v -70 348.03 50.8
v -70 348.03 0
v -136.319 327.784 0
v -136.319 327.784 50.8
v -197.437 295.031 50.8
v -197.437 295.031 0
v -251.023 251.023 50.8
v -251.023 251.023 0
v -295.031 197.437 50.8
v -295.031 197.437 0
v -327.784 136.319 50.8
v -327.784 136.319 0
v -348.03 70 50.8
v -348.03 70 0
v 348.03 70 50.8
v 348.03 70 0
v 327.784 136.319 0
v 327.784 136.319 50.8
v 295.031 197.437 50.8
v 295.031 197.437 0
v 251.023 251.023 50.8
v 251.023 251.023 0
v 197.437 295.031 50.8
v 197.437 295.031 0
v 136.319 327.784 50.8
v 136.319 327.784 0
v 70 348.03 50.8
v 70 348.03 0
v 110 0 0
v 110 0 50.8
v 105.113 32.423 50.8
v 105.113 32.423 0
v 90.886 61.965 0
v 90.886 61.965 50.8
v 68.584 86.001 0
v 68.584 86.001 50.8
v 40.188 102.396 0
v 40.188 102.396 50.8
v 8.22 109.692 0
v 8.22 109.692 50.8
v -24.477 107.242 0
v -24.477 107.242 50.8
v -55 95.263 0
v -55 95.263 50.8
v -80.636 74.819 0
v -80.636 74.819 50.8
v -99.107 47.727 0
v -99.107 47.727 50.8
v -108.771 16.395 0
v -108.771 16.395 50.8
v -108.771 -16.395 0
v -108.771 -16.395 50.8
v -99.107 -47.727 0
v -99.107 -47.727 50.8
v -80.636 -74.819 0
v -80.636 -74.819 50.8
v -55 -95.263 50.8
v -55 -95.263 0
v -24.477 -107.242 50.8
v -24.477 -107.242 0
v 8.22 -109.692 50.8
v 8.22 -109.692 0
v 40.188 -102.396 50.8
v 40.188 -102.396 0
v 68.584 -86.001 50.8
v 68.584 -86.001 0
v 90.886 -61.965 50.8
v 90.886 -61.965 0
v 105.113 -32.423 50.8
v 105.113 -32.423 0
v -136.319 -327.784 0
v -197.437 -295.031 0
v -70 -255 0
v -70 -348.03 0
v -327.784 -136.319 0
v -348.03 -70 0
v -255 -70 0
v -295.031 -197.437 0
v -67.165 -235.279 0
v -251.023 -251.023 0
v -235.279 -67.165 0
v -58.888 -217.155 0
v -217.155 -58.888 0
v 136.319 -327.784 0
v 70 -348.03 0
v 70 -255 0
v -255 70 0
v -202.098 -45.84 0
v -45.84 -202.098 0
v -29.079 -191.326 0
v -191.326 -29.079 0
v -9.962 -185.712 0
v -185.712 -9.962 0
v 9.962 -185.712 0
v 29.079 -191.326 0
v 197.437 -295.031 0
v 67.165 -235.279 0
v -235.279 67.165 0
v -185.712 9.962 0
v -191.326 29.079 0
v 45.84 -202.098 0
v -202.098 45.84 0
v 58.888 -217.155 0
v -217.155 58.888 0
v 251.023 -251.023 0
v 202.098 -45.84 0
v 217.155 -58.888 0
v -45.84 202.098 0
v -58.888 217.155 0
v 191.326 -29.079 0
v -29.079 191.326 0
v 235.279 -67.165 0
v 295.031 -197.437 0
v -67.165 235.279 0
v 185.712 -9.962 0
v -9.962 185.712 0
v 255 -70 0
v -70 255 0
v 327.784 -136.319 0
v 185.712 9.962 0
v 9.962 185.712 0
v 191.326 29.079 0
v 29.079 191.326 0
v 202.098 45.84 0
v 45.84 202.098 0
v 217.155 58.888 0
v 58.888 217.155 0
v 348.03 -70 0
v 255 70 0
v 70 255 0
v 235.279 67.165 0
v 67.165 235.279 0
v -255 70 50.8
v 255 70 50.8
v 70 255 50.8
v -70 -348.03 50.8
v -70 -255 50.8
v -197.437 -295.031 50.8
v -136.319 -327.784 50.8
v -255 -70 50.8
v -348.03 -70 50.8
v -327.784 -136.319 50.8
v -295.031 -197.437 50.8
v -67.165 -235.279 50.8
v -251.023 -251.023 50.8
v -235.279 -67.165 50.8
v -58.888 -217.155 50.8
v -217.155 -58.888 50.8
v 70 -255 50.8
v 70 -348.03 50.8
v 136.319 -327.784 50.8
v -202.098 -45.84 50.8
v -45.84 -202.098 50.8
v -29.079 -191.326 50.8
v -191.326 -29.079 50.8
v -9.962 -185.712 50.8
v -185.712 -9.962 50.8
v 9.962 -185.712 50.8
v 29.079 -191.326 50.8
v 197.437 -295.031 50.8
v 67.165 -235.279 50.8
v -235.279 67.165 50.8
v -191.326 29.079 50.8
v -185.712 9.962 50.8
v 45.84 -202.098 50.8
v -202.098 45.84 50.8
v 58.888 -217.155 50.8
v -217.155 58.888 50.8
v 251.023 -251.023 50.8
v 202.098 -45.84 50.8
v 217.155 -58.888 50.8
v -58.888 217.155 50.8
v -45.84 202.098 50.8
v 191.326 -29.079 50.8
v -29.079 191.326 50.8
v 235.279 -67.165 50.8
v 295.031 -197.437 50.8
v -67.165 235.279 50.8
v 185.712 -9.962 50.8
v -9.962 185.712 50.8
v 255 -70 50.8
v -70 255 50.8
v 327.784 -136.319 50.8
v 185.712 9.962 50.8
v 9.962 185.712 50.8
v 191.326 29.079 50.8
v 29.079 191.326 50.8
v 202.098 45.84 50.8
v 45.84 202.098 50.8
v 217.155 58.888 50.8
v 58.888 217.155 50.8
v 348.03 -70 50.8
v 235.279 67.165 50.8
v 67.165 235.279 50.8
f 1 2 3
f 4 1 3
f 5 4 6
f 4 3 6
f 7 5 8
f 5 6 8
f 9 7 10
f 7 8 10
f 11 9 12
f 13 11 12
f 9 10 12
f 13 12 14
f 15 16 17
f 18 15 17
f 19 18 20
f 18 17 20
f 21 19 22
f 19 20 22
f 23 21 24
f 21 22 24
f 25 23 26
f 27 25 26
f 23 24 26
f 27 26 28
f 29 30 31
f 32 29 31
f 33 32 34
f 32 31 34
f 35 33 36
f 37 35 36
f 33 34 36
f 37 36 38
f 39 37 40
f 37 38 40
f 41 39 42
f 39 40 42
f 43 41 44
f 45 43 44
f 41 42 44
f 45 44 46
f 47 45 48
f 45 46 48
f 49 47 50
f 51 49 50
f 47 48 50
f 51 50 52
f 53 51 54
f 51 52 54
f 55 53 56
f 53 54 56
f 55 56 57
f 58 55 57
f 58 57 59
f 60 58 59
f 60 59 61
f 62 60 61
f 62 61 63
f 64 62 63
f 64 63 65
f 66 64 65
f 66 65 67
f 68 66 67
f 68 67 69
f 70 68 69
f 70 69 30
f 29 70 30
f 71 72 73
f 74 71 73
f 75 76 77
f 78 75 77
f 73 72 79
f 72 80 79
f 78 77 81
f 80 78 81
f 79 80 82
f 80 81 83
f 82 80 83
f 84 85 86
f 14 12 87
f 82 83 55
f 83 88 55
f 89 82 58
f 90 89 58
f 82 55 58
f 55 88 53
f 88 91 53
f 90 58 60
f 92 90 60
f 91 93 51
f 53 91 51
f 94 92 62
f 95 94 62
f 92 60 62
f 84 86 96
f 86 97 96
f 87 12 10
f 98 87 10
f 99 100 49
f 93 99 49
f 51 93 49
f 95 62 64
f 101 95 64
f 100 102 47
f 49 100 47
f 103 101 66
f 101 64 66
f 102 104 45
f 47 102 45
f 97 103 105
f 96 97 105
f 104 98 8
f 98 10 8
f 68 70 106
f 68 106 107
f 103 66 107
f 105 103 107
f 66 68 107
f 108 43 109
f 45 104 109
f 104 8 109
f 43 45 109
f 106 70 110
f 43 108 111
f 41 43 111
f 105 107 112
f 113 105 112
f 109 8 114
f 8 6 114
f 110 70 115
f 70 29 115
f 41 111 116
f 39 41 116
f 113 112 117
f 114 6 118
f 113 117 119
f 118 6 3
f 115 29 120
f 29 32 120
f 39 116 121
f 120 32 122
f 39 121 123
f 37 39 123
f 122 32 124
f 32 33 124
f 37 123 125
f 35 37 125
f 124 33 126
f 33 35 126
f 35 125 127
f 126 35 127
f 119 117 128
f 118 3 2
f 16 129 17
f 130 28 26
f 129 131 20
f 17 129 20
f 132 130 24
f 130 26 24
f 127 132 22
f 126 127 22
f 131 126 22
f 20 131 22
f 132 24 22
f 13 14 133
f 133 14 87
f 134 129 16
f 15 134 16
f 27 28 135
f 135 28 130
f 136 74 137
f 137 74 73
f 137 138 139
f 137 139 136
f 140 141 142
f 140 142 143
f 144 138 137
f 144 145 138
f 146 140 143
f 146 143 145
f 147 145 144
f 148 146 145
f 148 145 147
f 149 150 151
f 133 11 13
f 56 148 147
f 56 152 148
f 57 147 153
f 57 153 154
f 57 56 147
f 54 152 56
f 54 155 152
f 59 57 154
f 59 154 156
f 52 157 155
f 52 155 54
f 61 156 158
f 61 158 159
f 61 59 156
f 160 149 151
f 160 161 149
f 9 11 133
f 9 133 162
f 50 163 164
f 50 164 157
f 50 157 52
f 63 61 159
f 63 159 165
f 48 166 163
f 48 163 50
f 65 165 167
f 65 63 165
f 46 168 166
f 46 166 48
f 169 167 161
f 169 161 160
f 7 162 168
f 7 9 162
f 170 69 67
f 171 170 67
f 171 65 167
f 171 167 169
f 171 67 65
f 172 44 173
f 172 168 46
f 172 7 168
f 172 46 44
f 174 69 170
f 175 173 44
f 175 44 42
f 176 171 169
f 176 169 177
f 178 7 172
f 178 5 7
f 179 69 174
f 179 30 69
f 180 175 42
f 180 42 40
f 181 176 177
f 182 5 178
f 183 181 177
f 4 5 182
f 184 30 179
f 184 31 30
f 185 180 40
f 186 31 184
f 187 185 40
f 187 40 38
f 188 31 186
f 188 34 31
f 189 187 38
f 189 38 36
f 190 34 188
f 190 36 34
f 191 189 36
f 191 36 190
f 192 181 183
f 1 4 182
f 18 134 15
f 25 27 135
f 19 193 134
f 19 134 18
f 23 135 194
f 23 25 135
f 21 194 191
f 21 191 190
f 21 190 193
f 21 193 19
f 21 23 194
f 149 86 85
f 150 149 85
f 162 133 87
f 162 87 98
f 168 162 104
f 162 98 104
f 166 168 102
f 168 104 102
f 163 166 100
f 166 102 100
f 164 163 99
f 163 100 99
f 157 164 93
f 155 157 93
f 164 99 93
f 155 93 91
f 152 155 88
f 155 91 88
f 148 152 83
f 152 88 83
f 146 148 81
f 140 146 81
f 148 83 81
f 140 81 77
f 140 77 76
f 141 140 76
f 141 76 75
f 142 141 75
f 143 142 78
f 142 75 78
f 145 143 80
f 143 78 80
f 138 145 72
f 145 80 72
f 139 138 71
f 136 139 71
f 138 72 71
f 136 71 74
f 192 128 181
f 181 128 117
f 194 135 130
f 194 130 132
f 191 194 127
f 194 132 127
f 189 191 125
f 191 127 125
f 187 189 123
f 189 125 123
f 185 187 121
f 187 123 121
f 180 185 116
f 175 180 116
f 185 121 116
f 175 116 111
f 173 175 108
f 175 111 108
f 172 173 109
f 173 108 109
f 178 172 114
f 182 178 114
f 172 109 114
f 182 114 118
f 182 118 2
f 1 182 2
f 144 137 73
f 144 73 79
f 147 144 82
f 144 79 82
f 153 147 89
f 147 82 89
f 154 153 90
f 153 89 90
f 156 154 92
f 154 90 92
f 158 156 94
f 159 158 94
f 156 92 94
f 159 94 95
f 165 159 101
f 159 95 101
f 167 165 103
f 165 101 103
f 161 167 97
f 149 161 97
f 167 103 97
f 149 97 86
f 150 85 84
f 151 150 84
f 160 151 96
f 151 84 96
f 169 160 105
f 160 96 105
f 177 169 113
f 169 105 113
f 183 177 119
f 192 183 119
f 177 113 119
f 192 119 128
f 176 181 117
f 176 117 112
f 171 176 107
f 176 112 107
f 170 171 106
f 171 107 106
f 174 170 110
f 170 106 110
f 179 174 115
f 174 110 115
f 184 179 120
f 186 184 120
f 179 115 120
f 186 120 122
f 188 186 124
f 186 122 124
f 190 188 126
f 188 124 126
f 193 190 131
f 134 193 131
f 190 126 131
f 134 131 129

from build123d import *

# Parameters (mm, degrees)
BOSS_EXTRUDE1_DEPTH = 50.8
SKETCH2_R           = 110
CUT_EXTRUDE1_DEPTH  = 495.80363782


with BuildPart() as part:
    # Sketch1 → Boss-Extrude1 (new body)
    with BuildSketch(Plane.XY):
        with BuildLine():
            ThreePointArc((348.030171106, 70), (251.022907321, 251.022907321), (70, 348.030171106))
            Line((70, 348.030171106), (70, 255))
            ThreePointArc((70, 255), (0, 185), (-70, 255))
            Line((-70, 255), (-70, 348.030171106))
            ThreePointArc((-70, 348.030171106), (-251.022907321, 251.022907321), (-348.030171106, 70))
            Line((-348.030171106, 70), (-255, 70))
            ThreePointArc((-255, 70), (-185, 0), (-255, -70))
            Line((-255, -70), (-348.030171106, -70))
            ThreePointArc((-348.030171106, -70), (-251.022907321, -251.022907321), (-70, -348.030171106))
            Line((-70, -348.030171106), (-70, -255))
            ThreePointArc((-70, -255), (0, -185), (70, -255))
            Line((70, -255), (70, -348.030171106))
            ThreePointArc((70, -348.030171106), (251.022907321, -251.022907321), (348.030171106, -70))
            Line((348.030171106, -70), (255, -70))
            ThreePointArc((255, -70), (185, 0), (255, 70))
            Line((255, 70), (348.030171106, 70))
        make_face()
    extrude(amount=BOSS_EXTRUDE1_DEPTH)

    # Sketch2 → Cut-Extrude1 (cut, through all)
    with BuildSketch(Plane.XY.offset(50.8)):
        Circle(SKETCH2_R)
    extrude(amount=-CUT_EXTRUDE1_DEPTH, mode=Mode.SUBTRACT)


solid = part.part
